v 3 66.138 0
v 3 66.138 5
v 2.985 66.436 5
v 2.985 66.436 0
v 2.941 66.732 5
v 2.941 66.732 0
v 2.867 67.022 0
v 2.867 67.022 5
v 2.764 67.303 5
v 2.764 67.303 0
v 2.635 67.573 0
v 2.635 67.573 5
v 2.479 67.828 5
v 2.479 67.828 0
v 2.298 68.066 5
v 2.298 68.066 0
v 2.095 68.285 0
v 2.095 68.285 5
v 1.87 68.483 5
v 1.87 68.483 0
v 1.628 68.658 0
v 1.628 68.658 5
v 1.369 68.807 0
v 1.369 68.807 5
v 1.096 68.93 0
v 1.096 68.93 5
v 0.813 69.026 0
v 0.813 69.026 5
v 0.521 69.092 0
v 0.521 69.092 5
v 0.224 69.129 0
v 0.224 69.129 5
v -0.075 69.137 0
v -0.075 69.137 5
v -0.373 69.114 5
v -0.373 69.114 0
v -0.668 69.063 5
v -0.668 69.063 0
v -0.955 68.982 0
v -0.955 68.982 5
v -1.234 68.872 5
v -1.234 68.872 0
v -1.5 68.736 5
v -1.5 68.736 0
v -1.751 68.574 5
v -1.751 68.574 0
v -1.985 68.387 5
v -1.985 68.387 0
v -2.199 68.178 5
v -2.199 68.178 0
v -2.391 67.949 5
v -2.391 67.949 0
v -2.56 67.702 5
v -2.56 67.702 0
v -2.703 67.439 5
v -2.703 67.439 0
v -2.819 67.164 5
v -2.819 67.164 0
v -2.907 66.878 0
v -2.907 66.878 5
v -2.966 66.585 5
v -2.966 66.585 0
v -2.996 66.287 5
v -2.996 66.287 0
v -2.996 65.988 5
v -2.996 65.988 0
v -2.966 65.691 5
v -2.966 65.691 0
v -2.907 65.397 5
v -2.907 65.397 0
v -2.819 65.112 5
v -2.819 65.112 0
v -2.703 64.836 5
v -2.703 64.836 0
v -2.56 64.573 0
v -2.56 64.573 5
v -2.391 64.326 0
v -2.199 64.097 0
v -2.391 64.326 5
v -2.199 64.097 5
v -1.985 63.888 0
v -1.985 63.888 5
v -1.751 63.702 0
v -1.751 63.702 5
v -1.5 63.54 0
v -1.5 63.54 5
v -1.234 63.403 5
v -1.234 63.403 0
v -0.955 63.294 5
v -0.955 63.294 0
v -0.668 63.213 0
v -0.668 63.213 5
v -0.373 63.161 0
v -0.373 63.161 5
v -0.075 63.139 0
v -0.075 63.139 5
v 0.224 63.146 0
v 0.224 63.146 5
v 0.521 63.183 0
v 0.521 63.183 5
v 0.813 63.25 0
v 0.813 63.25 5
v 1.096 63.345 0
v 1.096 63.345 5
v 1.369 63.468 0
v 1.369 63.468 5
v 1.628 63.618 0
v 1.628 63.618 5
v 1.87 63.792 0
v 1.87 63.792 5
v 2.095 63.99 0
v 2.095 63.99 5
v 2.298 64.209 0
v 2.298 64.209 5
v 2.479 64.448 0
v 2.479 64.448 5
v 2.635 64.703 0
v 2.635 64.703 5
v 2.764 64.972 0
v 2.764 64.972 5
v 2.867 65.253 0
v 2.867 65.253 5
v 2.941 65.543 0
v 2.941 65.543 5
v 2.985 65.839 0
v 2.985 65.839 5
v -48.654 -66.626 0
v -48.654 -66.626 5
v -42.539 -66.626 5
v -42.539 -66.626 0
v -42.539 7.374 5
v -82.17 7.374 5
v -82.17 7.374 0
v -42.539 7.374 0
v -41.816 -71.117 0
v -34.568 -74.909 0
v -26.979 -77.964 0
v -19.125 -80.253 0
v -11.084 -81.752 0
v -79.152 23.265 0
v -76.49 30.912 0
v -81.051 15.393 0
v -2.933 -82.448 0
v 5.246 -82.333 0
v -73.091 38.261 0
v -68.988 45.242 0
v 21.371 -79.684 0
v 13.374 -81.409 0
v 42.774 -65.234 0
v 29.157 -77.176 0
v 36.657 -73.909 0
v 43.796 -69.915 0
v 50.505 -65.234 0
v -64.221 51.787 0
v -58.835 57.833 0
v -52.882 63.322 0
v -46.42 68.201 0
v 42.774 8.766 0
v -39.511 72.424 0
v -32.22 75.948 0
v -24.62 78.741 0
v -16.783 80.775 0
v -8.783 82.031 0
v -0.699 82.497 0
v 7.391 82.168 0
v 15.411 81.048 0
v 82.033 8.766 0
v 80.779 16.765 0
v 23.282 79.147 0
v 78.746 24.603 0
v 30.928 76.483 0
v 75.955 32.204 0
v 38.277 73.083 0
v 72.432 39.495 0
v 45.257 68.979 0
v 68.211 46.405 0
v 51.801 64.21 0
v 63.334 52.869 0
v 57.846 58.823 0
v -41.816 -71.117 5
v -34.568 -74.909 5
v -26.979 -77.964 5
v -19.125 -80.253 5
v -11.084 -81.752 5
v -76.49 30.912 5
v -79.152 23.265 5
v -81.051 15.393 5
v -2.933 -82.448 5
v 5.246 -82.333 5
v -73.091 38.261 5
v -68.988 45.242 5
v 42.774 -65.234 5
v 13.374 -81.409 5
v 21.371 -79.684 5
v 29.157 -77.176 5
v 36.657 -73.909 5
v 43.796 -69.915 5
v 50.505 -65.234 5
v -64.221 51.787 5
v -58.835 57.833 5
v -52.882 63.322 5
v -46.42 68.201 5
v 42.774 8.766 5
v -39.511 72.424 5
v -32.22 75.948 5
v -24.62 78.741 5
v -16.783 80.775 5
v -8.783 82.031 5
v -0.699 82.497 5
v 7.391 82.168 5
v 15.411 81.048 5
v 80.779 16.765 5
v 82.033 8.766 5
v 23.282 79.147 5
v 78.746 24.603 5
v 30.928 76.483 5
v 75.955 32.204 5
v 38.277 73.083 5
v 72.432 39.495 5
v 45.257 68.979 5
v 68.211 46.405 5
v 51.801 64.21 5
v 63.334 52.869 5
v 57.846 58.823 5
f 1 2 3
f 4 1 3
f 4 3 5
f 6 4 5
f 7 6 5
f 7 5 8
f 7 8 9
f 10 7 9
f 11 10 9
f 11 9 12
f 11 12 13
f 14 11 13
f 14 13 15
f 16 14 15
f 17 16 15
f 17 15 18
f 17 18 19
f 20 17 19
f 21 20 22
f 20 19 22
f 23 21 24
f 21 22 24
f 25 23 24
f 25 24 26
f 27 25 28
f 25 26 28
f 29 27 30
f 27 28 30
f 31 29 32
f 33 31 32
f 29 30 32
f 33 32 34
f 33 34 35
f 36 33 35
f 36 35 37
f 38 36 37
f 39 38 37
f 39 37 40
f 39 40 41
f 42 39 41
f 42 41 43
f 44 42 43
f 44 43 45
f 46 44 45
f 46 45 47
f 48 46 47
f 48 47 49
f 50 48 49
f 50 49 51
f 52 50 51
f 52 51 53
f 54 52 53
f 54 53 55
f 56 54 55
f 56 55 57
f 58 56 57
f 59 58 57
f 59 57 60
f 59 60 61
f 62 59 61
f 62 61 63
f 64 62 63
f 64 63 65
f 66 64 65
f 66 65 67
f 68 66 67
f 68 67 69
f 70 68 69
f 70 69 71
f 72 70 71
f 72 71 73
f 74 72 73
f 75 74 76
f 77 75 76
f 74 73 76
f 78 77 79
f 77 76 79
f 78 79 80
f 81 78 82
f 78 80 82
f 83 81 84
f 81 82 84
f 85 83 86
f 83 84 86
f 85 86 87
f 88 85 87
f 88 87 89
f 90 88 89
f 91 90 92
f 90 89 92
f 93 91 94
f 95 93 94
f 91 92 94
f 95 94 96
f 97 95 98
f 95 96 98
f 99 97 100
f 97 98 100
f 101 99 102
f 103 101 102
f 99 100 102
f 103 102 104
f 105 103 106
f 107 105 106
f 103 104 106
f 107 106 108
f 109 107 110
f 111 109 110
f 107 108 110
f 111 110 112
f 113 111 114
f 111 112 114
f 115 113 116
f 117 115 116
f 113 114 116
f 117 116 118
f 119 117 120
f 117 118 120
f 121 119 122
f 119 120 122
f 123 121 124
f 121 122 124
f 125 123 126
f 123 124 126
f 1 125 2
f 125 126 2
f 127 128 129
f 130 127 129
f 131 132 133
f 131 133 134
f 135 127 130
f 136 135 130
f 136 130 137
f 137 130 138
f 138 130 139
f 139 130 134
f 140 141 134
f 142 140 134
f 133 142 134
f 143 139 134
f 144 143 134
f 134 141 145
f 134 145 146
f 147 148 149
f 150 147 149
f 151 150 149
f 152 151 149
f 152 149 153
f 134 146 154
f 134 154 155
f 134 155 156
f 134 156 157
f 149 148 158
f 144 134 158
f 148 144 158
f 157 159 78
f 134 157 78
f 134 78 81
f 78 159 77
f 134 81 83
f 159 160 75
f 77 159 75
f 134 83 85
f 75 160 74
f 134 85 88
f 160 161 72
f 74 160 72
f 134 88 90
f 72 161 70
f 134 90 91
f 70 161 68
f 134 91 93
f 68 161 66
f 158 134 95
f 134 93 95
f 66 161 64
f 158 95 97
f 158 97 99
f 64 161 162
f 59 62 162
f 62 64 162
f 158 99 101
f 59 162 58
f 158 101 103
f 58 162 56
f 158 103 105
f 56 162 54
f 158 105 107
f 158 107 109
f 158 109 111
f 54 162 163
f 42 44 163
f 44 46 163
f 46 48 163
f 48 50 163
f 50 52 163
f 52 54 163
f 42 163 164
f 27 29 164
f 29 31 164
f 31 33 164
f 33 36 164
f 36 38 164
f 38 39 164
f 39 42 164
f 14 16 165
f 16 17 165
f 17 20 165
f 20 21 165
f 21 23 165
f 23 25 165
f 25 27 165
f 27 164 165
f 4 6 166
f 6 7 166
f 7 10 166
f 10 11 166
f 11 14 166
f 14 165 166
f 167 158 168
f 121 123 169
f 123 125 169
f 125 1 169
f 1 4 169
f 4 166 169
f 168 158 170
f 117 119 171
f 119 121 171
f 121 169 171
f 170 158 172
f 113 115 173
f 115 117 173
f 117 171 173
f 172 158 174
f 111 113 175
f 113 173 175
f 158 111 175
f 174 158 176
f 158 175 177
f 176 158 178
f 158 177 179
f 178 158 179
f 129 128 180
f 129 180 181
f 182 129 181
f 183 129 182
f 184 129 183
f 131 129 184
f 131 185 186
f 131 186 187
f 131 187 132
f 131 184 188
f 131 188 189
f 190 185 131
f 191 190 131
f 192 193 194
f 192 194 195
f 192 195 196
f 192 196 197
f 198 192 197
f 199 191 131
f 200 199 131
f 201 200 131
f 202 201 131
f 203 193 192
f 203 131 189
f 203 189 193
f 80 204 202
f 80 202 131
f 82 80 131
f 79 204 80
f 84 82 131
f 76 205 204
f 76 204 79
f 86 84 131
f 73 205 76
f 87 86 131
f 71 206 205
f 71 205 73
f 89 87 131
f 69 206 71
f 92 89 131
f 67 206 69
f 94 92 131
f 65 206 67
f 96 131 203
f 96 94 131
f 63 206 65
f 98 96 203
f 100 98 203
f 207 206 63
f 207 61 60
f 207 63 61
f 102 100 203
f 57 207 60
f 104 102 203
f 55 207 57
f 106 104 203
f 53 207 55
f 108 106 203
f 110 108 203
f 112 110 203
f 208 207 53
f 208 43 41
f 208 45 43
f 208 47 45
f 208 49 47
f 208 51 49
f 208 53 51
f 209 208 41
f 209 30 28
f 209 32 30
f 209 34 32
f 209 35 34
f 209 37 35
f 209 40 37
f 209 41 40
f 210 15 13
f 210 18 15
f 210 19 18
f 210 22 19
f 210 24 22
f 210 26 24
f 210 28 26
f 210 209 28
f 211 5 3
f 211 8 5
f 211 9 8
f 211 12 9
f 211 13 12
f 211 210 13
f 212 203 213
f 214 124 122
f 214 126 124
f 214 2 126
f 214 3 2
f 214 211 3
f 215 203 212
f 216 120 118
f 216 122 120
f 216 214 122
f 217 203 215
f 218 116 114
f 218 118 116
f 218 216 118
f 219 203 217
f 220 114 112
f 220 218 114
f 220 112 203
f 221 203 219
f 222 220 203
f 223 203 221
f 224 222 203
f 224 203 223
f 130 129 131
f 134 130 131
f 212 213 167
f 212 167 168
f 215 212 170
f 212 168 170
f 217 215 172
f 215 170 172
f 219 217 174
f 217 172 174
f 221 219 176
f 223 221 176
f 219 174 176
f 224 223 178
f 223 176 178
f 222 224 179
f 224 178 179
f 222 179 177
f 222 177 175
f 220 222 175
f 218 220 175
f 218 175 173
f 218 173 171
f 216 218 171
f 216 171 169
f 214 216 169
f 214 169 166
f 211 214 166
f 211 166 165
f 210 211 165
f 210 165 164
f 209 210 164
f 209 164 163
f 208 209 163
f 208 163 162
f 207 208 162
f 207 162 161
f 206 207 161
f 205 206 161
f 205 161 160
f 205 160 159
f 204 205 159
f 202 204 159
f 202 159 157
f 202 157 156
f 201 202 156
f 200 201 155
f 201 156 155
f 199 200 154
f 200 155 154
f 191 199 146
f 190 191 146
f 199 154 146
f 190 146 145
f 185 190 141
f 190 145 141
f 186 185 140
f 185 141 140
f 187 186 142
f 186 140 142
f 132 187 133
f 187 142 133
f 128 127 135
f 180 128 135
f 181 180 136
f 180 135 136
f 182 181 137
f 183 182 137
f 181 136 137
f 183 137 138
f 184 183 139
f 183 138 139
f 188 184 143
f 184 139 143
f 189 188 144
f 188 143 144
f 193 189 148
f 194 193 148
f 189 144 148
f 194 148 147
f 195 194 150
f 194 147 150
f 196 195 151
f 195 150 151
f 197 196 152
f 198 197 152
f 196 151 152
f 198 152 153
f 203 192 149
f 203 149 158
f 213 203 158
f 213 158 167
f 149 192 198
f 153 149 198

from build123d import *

# Parameters (mm, degrees)
SKETCH_R     = 82.5
PAD_DEPTH    = 5
SKETCH001_W  = 40
SKETCH001_H  = 74
POCKET_DEPTH = 5
SKETCH002_R  = 3
HOLE_DEPTH   = 25


with BuildPart() as part:
    # Sketch → Pad (new body)
    with BuildSketch(Plane.XY):
        Circle(SKETCH_R)
    extrude(amount=PAD_DEPTH)

    # Sketch001 (on Face3 of Pad) → Pocket (cut)
    with BuildSketch(Plane.XY.offset(5)):
        with Locations((-62.53936, -29.626459)):
            Rectangle(SKETCH001_W, SKETCH001_H)
        with Locations((62.773894, -28.234338)):
            Rectangle(SKETCH001_W, SKETCH001_H)
    extrude(amount=-POCKET_DEPTH, mode=Mode.SUBTRACT)

    # Sketch002 (on Face4 of Pocket) → Hole (cut)
    with BuildSketch(Plane.XY.offset(5)):
        with Locations((0, 66.137764)):
            Circle(SKETCH002_R)
    extrude(amount=-HOLE_DEPTH, mode=Mode.SUBTRACT)


solid = part.part
